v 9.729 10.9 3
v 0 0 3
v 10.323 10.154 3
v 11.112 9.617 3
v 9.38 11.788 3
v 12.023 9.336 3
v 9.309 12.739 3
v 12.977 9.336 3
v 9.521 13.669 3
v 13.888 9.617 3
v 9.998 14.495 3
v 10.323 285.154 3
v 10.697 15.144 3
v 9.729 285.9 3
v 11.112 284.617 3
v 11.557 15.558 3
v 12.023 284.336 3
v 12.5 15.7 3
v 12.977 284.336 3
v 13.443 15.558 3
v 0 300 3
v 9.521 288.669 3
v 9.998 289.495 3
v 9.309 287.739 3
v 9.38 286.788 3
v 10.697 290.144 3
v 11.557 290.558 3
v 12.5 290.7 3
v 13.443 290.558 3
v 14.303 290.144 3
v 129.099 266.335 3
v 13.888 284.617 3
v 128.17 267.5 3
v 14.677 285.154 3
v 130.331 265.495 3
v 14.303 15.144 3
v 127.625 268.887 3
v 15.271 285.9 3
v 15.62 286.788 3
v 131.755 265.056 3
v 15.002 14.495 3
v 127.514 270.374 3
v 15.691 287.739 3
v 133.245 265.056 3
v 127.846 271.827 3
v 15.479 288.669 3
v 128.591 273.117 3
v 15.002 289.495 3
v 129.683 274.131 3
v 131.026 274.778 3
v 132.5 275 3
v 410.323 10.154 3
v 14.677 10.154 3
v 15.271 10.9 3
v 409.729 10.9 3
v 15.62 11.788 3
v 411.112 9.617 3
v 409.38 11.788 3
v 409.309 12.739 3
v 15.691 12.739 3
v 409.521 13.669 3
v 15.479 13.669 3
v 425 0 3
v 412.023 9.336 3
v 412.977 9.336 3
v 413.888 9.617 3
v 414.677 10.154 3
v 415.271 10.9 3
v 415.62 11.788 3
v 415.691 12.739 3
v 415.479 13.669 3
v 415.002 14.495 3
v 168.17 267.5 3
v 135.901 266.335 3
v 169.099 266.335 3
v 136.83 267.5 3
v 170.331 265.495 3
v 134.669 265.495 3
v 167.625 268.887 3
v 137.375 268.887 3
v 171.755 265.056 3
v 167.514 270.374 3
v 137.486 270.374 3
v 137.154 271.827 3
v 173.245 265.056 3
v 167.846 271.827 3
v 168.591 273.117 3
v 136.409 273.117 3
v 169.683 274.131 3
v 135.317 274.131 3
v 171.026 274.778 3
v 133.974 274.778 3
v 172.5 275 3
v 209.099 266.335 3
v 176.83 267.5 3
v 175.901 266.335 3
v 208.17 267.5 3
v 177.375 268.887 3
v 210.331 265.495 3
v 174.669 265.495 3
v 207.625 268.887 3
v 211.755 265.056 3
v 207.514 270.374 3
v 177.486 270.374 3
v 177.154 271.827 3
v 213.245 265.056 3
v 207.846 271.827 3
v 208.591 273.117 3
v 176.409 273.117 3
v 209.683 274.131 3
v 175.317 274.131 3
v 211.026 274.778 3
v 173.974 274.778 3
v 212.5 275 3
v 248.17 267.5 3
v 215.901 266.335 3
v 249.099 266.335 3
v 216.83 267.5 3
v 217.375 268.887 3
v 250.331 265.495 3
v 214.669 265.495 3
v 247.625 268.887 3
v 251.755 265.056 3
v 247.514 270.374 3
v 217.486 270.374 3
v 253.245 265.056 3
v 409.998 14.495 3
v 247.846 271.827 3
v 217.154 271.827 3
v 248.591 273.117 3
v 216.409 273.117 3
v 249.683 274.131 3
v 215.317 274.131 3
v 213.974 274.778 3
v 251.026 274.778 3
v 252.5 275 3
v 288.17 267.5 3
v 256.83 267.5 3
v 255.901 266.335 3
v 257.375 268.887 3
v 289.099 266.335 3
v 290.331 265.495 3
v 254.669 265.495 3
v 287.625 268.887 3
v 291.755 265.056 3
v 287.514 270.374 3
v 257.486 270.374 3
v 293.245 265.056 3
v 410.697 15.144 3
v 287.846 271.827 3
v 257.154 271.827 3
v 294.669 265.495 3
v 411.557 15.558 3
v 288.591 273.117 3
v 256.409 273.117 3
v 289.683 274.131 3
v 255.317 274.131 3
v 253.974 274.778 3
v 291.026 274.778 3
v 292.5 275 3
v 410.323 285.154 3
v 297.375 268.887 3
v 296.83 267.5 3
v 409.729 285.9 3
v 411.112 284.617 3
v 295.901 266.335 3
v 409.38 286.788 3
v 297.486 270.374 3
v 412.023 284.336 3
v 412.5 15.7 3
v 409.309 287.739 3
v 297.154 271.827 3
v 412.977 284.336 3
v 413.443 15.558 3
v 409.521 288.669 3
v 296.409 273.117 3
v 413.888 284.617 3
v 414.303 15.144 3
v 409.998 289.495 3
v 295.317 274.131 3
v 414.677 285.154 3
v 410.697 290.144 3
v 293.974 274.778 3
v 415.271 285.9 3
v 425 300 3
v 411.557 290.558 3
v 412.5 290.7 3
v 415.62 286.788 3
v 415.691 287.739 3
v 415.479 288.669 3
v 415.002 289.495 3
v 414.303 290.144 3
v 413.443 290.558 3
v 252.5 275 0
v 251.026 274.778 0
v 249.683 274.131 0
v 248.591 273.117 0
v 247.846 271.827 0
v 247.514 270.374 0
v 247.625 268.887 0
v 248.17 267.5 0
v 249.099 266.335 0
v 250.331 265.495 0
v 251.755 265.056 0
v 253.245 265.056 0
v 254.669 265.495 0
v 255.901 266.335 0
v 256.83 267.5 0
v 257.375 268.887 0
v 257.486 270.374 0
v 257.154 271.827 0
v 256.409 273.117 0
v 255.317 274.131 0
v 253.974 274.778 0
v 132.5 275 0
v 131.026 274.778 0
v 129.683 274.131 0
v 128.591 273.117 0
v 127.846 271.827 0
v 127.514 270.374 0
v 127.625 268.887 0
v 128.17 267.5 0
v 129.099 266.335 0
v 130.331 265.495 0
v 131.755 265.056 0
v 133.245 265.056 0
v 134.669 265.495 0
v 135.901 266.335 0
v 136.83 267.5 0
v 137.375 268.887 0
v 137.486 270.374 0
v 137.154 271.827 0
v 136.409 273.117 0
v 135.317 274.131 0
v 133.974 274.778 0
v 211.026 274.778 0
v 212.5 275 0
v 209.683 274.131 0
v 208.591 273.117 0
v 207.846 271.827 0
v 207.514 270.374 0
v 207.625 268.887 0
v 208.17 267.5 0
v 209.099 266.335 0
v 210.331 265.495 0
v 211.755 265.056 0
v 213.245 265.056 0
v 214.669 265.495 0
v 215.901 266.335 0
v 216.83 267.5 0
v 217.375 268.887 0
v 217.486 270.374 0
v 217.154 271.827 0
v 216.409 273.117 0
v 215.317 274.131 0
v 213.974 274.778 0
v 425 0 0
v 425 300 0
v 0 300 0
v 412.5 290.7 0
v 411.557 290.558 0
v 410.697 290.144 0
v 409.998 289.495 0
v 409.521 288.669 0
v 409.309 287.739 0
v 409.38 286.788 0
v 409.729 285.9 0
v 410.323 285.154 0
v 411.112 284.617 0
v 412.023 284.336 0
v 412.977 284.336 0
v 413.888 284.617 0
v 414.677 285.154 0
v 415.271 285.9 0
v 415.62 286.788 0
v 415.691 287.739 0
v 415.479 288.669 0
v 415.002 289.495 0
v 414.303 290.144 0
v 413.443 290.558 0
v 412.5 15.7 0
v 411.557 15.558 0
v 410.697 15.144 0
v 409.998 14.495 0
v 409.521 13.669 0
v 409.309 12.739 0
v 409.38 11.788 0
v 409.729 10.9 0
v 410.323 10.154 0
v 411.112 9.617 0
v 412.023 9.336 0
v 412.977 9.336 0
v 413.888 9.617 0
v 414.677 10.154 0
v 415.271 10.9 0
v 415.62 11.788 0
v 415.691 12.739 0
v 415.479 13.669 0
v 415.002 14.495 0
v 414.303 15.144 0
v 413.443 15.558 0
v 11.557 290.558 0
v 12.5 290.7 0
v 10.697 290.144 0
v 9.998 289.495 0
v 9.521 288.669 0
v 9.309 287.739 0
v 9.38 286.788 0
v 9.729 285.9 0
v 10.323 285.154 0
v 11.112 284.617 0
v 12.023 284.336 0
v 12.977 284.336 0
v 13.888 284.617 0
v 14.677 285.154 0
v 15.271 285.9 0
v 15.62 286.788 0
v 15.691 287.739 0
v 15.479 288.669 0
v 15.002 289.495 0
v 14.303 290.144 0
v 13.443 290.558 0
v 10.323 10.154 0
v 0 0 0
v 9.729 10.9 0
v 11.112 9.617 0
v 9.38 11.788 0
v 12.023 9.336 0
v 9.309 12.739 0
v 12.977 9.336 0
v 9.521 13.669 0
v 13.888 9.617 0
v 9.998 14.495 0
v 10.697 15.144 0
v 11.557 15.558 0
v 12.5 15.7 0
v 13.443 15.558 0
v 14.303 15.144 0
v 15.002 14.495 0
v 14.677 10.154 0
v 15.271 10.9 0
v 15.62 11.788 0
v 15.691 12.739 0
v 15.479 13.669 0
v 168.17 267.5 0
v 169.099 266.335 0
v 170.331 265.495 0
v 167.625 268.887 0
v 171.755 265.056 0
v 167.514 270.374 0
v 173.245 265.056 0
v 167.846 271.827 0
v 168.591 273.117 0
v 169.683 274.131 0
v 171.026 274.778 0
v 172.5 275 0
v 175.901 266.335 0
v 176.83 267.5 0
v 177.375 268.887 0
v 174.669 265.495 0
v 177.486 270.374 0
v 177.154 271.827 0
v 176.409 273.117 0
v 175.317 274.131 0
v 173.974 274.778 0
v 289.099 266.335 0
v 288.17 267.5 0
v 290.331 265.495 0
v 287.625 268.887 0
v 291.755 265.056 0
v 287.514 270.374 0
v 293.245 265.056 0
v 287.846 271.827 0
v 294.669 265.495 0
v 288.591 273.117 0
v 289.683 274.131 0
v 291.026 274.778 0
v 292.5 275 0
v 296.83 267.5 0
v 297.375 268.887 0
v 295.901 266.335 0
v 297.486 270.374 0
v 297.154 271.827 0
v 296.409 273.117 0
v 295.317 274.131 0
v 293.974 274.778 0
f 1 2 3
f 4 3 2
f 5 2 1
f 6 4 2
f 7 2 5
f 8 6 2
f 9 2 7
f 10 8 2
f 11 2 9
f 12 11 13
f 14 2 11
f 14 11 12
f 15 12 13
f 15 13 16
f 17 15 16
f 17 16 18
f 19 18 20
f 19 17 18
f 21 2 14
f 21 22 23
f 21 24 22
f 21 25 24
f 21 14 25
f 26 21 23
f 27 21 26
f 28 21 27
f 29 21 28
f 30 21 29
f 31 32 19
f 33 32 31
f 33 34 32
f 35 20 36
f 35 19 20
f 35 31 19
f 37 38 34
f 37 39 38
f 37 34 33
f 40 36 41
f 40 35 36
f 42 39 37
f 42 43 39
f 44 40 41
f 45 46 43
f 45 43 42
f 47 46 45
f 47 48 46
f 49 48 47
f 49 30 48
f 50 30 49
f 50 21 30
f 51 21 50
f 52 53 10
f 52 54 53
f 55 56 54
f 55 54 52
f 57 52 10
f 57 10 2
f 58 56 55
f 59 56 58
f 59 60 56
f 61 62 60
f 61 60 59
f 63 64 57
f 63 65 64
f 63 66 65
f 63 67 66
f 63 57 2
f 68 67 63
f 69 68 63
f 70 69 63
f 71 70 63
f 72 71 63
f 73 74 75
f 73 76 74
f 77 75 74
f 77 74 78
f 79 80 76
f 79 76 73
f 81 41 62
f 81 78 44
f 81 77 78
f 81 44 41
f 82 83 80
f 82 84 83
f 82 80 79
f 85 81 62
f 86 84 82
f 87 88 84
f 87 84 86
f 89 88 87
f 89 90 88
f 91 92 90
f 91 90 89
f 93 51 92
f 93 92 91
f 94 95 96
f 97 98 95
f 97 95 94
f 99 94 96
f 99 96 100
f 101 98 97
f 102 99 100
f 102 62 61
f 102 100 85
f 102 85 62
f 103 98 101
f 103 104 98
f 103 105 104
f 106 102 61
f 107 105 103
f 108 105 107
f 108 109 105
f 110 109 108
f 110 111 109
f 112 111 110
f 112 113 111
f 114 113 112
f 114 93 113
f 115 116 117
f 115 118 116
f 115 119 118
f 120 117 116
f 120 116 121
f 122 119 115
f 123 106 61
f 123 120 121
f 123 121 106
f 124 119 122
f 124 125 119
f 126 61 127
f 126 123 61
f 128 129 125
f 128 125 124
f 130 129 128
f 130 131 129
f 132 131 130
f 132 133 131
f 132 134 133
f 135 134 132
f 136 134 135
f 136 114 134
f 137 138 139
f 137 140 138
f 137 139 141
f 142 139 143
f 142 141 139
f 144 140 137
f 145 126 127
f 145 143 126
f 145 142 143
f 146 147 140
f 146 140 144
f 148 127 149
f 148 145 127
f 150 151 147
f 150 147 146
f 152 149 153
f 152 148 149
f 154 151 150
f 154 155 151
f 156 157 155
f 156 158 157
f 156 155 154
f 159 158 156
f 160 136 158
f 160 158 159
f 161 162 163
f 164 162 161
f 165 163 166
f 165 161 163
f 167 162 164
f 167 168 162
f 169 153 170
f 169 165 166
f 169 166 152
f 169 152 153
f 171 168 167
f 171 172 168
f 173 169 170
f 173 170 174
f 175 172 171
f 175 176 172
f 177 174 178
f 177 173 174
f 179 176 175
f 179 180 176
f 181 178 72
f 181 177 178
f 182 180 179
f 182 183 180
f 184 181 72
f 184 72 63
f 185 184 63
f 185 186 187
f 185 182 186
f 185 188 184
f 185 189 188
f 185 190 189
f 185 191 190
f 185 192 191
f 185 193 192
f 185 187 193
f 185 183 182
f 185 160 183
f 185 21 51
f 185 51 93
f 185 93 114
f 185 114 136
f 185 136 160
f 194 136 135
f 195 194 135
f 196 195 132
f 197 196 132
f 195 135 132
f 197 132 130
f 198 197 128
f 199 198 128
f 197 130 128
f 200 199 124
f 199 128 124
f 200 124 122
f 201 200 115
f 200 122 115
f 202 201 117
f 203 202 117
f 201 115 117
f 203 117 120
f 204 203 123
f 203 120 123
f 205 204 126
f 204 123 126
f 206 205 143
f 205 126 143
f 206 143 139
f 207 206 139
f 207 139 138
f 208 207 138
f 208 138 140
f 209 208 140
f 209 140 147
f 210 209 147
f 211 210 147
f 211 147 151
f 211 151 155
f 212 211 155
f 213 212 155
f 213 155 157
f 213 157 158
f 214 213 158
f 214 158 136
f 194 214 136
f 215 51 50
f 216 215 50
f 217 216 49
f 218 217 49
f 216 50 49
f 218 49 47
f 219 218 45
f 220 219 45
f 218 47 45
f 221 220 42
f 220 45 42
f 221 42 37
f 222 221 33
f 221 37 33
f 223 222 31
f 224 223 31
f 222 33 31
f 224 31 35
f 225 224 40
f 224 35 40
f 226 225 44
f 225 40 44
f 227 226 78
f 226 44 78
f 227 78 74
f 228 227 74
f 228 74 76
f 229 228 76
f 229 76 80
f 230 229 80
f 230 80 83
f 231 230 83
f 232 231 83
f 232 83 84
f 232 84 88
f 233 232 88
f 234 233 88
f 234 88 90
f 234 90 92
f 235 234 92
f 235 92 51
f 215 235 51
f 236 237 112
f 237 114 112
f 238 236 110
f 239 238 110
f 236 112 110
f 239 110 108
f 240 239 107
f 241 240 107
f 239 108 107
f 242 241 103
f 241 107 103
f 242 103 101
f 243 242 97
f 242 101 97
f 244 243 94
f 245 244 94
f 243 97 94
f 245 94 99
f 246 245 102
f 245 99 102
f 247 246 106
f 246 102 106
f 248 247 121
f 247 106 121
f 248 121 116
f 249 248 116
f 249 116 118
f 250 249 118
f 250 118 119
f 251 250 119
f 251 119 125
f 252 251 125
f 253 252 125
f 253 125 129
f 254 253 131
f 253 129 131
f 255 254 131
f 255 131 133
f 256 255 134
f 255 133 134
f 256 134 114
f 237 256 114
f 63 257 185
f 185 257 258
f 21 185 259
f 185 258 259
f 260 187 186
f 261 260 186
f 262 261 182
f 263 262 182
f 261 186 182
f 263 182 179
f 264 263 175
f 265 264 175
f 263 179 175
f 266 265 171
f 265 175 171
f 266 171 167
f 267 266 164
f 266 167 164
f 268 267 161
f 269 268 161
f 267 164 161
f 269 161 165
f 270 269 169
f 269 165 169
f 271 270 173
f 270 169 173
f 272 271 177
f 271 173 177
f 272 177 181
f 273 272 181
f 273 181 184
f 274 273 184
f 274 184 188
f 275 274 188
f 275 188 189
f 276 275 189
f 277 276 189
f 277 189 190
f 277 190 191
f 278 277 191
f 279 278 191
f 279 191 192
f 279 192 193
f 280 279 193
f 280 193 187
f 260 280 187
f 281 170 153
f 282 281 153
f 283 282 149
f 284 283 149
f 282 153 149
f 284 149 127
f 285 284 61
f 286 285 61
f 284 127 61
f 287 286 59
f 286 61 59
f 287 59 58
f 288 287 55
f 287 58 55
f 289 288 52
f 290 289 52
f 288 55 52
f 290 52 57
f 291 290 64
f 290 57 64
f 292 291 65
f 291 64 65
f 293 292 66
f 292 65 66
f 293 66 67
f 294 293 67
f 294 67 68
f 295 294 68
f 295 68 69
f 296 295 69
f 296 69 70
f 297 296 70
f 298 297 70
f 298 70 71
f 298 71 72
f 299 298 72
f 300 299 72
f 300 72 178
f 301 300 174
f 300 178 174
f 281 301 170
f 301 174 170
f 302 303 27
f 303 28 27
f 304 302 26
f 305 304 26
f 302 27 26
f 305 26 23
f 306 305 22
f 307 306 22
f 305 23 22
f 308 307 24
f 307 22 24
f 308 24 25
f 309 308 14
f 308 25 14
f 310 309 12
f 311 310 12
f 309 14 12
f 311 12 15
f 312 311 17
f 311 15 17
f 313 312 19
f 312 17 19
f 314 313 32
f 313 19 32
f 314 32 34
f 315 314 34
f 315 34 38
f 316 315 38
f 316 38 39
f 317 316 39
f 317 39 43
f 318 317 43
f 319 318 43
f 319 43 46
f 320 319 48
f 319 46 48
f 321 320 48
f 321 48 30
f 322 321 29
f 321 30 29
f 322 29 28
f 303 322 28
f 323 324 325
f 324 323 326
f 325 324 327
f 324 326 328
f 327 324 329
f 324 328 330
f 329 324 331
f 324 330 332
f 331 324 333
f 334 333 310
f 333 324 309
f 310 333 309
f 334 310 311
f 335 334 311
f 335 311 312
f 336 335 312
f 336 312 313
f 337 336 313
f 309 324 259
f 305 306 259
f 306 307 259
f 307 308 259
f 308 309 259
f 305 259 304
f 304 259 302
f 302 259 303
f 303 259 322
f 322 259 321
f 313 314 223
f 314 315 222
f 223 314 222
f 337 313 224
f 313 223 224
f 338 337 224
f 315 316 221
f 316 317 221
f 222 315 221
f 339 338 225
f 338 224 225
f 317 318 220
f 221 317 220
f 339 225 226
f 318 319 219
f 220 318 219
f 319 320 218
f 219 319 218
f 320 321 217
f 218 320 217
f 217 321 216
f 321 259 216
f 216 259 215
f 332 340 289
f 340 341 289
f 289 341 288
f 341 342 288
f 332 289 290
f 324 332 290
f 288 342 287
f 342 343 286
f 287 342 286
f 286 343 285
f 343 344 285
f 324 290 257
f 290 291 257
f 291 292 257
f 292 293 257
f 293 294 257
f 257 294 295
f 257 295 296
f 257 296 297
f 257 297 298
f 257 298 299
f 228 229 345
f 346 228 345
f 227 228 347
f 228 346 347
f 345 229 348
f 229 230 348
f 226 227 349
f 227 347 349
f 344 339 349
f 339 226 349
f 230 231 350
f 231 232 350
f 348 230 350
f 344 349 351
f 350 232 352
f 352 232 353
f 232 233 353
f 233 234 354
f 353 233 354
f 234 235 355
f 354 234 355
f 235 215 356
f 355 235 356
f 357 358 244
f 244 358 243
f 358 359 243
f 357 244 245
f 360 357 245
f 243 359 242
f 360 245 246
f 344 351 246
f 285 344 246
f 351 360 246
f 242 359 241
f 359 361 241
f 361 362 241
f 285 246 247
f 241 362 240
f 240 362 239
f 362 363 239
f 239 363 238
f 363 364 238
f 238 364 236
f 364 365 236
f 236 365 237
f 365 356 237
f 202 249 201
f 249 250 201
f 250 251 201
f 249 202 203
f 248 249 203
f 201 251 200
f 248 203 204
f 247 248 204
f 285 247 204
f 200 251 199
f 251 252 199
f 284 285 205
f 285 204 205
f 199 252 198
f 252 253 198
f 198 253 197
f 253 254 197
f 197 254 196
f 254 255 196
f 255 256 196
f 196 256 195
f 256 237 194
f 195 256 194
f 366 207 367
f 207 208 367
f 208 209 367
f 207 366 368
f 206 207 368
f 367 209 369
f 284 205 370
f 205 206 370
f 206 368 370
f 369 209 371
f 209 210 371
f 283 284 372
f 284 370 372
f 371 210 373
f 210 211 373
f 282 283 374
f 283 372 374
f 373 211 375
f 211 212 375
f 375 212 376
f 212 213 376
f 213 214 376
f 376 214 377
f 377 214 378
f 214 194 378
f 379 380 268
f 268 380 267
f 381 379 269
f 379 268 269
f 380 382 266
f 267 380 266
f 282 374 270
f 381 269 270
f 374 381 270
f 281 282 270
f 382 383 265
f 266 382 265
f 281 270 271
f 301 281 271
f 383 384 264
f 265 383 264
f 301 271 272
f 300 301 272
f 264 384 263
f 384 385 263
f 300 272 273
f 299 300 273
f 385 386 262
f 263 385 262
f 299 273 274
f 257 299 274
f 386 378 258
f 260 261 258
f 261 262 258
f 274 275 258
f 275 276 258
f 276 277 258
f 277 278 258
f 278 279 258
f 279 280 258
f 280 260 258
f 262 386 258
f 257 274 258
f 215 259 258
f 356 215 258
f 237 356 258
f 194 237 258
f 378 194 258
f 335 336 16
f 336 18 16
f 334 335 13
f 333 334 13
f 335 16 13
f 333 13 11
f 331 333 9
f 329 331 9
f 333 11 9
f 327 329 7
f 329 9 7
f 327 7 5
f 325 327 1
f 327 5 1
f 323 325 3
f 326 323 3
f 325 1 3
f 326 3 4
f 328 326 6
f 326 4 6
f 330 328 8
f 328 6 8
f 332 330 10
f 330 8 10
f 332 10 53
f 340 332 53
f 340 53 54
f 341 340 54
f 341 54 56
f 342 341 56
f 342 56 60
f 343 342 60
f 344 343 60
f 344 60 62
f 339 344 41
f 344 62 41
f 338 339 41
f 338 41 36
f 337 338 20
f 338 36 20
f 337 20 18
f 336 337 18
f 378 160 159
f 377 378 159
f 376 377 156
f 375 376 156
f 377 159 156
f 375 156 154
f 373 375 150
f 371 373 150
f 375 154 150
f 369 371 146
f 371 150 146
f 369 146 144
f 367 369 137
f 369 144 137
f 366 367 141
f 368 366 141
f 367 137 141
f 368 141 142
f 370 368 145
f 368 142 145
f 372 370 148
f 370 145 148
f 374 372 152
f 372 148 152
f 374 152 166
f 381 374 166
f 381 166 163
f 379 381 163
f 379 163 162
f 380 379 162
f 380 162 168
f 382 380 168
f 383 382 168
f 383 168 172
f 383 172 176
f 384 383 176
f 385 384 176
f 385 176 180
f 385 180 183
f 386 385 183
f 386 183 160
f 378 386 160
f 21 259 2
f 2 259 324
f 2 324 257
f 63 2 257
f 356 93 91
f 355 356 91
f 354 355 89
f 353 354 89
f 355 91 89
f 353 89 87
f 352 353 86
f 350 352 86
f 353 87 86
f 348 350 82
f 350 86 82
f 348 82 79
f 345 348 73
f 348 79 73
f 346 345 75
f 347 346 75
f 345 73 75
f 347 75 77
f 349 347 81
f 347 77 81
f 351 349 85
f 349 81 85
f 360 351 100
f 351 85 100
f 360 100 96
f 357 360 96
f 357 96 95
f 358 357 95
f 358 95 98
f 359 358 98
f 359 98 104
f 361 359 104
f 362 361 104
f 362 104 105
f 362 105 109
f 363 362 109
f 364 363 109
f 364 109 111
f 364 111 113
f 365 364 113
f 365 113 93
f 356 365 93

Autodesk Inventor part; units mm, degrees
ref_plane "YZ Plane" through (0, 0, 0) normal (1, 0, 0) x (0, 1, 0)
ref_plane "XZ Plane" through (0, 0, 0) normal (0, 1, 0) x (-1, 0, 0)
ref_plane "XY Plane" through (0, 0, 0) normal (0, 0, 1) x (1, 0, 0)
sketch "Sketch1" plane through (0, 0, 0) normal (0, 0, 1) x (1, 0, 0)
  line L0 (0, 0) -> (425, 0)
  line L1 (425, 0) -> (425, 300)
  line L2 (425, 300) -> (0, 300)
  line L3 (0, 300) -> (0, 0)
  line L4 (12.5, 287.5) -> (12.5, 12.5) construction
  line L5 (412.5, 287.5) -> (412.5, 12.5) construction
  point P0 (132.5, 270)
  point P1 (172.5, 270)
  point P2 (212.5, 270)
  point P3 (252.5, 270)
  point P4 (292.5, 270)
  point P5 (212.5, 300)
  dimension "d0" = 425
  dimension "d1" = 300
  dimension "d2" = 400
  dimension "d3" = 12.5
  dimension "d4" = 12.5
  dimension "d5" = 12.5
  dimension "d6" = 12.5
  dimension "d7" = 12.5
  dimension "d19" = 40
  dimension "d24" = 212.5
  dimension "d32" = 30
extrude "Extrusion1" add sketch "Sketch1" along normal blind 3
hole "Hole1" at (12.5, 287.5, 0) at (412.5, 287.5, 0) at (12.5, 12.5, 0) at (412.5, 12.5, 0) direction (0, 0, 1) diameter 6.4 end through all
hole "Hole2" at (132.5, 270, 0) at (172.5, 270, 0) at (212.5, 270, 0) at (252.5, 270, 0) at (292.5, 270, 0) direction (0, 0, 1) diameter 10 end through all
properties part number "back_wall"
